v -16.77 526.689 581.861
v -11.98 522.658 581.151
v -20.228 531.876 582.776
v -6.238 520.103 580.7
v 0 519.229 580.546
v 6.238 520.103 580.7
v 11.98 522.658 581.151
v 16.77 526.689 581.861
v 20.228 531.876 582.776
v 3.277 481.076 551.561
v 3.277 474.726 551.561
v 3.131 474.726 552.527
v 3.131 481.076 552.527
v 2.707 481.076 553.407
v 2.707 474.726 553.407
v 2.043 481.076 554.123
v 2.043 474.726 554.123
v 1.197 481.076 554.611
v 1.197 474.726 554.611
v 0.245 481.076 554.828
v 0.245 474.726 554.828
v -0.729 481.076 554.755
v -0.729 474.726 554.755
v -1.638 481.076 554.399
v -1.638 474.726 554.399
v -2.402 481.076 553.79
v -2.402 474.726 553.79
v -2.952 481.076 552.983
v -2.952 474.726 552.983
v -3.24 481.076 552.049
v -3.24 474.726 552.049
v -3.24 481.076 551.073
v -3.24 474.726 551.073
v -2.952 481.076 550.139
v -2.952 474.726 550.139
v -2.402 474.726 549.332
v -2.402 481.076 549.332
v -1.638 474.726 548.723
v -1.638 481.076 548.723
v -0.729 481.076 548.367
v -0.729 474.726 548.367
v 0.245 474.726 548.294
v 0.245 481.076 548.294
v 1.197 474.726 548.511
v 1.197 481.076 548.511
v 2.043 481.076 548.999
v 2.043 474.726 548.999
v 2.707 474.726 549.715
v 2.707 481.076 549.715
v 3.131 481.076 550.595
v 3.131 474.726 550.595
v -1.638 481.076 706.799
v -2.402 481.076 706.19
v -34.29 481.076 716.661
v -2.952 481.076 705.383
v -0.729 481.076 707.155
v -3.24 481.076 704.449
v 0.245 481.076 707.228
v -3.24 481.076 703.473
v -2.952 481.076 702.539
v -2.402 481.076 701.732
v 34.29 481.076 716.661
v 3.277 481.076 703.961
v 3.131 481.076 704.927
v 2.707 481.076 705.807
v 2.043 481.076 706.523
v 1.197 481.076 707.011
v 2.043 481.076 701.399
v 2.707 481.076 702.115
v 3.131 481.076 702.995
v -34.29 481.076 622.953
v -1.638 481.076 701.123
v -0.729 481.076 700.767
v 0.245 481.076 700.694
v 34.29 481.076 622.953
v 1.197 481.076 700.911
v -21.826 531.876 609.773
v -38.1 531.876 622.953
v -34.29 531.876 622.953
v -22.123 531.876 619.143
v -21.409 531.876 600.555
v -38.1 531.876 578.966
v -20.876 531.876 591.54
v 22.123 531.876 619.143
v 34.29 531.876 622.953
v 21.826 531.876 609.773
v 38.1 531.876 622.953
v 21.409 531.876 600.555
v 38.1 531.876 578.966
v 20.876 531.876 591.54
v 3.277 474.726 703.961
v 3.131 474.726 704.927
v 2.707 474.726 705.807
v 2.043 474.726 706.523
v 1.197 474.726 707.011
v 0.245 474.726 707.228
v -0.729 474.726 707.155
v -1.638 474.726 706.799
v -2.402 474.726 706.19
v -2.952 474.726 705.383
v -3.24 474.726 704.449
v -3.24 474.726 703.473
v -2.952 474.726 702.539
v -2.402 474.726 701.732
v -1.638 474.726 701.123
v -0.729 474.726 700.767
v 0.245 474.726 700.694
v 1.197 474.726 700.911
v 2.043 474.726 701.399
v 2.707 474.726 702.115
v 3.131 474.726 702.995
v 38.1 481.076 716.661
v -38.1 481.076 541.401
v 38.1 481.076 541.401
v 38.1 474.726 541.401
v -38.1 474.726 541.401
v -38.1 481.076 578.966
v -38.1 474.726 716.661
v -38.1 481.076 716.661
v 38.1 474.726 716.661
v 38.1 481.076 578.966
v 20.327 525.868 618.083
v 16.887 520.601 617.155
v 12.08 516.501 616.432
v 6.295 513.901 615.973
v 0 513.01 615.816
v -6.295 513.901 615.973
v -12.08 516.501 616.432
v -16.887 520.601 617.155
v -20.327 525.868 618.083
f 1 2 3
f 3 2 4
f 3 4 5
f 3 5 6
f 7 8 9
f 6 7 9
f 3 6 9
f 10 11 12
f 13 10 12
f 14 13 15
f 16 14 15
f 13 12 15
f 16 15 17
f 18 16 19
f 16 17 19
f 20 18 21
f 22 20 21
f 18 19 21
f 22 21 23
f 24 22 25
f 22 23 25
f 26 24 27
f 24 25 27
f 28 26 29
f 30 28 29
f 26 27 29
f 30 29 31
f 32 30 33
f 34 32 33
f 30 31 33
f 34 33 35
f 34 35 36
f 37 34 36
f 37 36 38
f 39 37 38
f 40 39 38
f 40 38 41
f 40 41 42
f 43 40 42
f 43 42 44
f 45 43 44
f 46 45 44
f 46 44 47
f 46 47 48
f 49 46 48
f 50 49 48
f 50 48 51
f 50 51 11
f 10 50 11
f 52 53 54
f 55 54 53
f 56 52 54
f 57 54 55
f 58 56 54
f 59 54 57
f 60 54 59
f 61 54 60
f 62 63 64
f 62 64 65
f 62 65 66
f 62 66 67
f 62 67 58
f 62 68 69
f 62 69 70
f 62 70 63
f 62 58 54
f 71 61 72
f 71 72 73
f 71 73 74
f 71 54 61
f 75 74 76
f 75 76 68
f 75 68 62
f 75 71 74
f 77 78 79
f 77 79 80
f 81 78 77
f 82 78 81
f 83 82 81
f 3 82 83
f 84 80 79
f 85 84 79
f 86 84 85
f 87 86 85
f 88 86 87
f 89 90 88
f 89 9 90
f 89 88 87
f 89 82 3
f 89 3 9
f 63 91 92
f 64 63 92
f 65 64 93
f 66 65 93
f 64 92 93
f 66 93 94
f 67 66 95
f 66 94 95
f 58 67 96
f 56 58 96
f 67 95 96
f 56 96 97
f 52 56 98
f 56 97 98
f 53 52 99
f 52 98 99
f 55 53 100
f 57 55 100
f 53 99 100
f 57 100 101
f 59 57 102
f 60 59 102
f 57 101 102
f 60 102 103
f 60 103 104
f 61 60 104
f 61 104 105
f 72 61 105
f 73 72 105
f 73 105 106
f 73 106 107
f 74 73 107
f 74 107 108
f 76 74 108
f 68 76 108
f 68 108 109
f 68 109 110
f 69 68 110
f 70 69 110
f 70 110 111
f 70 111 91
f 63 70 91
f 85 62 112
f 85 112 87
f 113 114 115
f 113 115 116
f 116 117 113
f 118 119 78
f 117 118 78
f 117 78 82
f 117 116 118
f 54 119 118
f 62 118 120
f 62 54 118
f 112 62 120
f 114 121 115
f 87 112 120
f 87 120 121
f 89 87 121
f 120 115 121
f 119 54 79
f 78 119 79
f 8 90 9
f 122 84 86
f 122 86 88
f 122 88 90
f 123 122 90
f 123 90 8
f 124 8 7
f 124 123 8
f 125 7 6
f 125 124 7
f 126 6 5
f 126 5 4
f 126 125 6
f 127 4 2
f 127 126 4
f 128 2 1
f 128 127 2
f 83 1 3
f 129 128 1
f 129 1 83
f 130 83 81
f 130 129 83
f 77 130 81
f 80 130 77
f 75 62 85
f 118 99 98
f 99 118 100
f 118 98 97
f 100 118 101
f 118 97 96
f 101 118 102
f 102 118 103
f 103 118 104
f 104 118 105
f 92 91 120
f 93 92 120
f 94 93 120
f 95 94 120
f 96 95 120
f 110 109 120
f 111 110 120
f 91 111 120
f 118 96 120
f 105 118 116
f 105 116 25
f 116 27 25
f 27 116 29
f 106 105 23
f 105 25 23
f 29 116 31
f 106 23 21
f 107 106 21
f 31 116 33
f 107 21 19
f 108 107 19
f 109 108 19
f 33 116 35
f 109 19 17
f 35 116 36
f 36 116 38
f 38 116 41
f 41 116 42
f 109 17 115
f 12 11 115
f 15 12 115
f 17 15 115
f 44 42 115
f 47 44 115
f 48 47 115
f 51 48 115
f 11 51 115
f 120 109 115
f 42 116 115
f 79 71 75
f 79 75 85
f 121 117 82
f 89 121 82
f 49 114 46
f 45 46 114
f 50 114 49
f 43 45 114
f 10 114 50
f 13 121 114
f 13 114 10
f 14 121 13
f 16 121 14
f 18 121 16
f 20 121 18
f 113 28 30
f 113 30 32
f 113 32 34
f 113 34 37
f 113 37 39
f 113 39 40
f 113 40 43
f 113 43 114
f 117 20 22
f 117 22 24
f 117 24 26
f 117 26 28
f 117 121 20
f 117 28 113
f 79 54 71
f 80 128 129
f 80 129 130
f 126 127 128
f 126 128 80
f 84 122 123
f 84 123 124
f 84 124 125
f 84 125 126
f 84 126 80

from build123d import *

# Parameters (mm, degrees)
SKETCH7_W                = 76.2
SKETCH7_H                = 88.9
BOSS_EXTRUDE1_DEPTH      = 57.15
BOSS_EXTRUDE2_DEPTH      = 0.127
BOSS_EXTRUDE2_DEPTH_BACK = 35.687
SKETCH8_R                = 22.352
SKETCH10_W               = 30.208401757
SKETCH10_H               = 50.8
SKETCH10_W_2             = 14.705109565
CUT_EXTRUDE2_DEPTH       = 846.764631146
SKETCH11_W               = 76.2
SKETCH11_H               = 6.35
BOSS_EXTRUDE3_DEPTH      = 22.86
SKETCH14_W               = 76.2
SKETCH14_H               = 6.35
BOSS_EXTRUDE4_DEPTH      = 63.5
SKETCH12_R               = 3.2766
CUT_EXTRUDE3_DEPTH       = 720.944943326
RIB5_REACH               = 897.713
SKETCH17_WALL_W          = 1900.017933472
SKETCH17_WALL_H          = 3.81


with BuildPart() as part:
    # Sketch7 → Boss-Extrude1 (new body)
    with BuildSketch(Plane(origin=(0, 474.726, 0), x_dir=(1, 0, 0), z_dir=(0, 1, 0))):
        with Locations((0, -608.711)):
            Rectangle(SKETCH7_W, SKETCH7_H)
    extrude(amount=BOSS_EXTRUDE1_DEPTH)


with BuildPart() as body_2:
    # Sketch8 → Boss-Extrude2 (new, two sides: drawn at the far end of the back side and taken through both)
    with BuildSketch(Plane(origin=(0, -83.644613765, 474.372177356), x_dir=(-1, 0, 0), z_dir=(2.9130205458871294e-15, 0.17364817766694987, -0.9848077530122047)).offset(-BOSS_EXTRUDE2_DEPTH_BACK)):
        with Locations((0, 634.503351151)):
            Circle(SKETCH8_R)
    extrude(amount=BOSS_EXTRUDE2_DEPTH + BOSS_EXTRUDE2_DEPTH_BACK)


with BuildPart() as part_1:
    add(part.part)

    # Combine1: cut body 2
    add(body_2.part, mode=Mode.SUBTRACT)

    # Sketch10 → Cut-Extrude2 (cut, through all)
    with BuildSketch(Plane(origin=(38.1, 0, 0), x_dir=(0, 0, -1), z_dir=(1, 0, 0))):
        with Locations((-638.056799122, 506.476)):
            Rectangle(SKETCH10_W, SKETCH10_H)
        with Locations((-571.613554783, 506.476)):
            Rectangle(SKETCH10_W_2, SKETCH10_H)
    extrude(amount=-CUT_EXTRUDE2_DEPTH, mode=Mode.SUBTRACT)

    # Sketch11 → Boss-Extrude3 (add)
    with BuildSketch(Plane(origin=(0, 0, 564.261), x_dir=(-1, 0, 0), z_dir=(0, 0, -1))):
        with Locations((0, 477.901)):
            Rectangle(SKETCH11_W, SKETCH11_H)
    extrude(amount=BOSS_EXTRUDE3_DEPTH)

    # Sketch14 → Boss-Extrude4 (add)
    with BuildSketch(Plane.XY.offset(653.161)):
        with Locations((0, 477.901)):
            Rectangle(SKETCH14_W, SKETCH14_H)
    extrude(amount=BOSS_EXTRUDE4_DEPTH)

    # Sketch12 → Cut-Extrude3 (cut, through all)
    with BuildSketch(Plane.XZ.offset(-474.726)):
        with Locations((0, 703.961)):
            Circle(SKETCH12_R)
        with Locations((0, 551.561)):
            Circle(SKETCH12_R)
    extrude(amount=-CUT_EXTRUDE3_DEPTH, mode=Mode.SUBTRACT)

    # Sketch17 wall → Rib5 (add, up to next)
    with BuildSketch(Plane(origin=(38.1, 506.476, 669.806799122), x_dir=(0, 0.476582557871, -0.879129720538), z_dir=(0, 0.879129720538, 0.476582557871)), mode=Mode.PRIVATE) as rib5_sk1:
        with Locations((0, 1.905)):
            Rectangle(SKETCH17_WALL_W, SKETCH17_WALL_H)
    rib5_tool1 = extrude(rib5_sk1.sketch, amount=-RIB5_REACH, mode=Mode.PRIVATE) - part_1.part
    rib5 = rib5_tool1.solids().sort_by_distance((38.1, 506.476, 669.806799122))[0]
    add(rib5)

    # Mirror1: Rib5 across plane
    add(rib5.mirror(Plane(origin=(0, 0, 0), x_dir=(0, 0, 1), z_dir=(1, 0, 0))))


solid = part_1.part
